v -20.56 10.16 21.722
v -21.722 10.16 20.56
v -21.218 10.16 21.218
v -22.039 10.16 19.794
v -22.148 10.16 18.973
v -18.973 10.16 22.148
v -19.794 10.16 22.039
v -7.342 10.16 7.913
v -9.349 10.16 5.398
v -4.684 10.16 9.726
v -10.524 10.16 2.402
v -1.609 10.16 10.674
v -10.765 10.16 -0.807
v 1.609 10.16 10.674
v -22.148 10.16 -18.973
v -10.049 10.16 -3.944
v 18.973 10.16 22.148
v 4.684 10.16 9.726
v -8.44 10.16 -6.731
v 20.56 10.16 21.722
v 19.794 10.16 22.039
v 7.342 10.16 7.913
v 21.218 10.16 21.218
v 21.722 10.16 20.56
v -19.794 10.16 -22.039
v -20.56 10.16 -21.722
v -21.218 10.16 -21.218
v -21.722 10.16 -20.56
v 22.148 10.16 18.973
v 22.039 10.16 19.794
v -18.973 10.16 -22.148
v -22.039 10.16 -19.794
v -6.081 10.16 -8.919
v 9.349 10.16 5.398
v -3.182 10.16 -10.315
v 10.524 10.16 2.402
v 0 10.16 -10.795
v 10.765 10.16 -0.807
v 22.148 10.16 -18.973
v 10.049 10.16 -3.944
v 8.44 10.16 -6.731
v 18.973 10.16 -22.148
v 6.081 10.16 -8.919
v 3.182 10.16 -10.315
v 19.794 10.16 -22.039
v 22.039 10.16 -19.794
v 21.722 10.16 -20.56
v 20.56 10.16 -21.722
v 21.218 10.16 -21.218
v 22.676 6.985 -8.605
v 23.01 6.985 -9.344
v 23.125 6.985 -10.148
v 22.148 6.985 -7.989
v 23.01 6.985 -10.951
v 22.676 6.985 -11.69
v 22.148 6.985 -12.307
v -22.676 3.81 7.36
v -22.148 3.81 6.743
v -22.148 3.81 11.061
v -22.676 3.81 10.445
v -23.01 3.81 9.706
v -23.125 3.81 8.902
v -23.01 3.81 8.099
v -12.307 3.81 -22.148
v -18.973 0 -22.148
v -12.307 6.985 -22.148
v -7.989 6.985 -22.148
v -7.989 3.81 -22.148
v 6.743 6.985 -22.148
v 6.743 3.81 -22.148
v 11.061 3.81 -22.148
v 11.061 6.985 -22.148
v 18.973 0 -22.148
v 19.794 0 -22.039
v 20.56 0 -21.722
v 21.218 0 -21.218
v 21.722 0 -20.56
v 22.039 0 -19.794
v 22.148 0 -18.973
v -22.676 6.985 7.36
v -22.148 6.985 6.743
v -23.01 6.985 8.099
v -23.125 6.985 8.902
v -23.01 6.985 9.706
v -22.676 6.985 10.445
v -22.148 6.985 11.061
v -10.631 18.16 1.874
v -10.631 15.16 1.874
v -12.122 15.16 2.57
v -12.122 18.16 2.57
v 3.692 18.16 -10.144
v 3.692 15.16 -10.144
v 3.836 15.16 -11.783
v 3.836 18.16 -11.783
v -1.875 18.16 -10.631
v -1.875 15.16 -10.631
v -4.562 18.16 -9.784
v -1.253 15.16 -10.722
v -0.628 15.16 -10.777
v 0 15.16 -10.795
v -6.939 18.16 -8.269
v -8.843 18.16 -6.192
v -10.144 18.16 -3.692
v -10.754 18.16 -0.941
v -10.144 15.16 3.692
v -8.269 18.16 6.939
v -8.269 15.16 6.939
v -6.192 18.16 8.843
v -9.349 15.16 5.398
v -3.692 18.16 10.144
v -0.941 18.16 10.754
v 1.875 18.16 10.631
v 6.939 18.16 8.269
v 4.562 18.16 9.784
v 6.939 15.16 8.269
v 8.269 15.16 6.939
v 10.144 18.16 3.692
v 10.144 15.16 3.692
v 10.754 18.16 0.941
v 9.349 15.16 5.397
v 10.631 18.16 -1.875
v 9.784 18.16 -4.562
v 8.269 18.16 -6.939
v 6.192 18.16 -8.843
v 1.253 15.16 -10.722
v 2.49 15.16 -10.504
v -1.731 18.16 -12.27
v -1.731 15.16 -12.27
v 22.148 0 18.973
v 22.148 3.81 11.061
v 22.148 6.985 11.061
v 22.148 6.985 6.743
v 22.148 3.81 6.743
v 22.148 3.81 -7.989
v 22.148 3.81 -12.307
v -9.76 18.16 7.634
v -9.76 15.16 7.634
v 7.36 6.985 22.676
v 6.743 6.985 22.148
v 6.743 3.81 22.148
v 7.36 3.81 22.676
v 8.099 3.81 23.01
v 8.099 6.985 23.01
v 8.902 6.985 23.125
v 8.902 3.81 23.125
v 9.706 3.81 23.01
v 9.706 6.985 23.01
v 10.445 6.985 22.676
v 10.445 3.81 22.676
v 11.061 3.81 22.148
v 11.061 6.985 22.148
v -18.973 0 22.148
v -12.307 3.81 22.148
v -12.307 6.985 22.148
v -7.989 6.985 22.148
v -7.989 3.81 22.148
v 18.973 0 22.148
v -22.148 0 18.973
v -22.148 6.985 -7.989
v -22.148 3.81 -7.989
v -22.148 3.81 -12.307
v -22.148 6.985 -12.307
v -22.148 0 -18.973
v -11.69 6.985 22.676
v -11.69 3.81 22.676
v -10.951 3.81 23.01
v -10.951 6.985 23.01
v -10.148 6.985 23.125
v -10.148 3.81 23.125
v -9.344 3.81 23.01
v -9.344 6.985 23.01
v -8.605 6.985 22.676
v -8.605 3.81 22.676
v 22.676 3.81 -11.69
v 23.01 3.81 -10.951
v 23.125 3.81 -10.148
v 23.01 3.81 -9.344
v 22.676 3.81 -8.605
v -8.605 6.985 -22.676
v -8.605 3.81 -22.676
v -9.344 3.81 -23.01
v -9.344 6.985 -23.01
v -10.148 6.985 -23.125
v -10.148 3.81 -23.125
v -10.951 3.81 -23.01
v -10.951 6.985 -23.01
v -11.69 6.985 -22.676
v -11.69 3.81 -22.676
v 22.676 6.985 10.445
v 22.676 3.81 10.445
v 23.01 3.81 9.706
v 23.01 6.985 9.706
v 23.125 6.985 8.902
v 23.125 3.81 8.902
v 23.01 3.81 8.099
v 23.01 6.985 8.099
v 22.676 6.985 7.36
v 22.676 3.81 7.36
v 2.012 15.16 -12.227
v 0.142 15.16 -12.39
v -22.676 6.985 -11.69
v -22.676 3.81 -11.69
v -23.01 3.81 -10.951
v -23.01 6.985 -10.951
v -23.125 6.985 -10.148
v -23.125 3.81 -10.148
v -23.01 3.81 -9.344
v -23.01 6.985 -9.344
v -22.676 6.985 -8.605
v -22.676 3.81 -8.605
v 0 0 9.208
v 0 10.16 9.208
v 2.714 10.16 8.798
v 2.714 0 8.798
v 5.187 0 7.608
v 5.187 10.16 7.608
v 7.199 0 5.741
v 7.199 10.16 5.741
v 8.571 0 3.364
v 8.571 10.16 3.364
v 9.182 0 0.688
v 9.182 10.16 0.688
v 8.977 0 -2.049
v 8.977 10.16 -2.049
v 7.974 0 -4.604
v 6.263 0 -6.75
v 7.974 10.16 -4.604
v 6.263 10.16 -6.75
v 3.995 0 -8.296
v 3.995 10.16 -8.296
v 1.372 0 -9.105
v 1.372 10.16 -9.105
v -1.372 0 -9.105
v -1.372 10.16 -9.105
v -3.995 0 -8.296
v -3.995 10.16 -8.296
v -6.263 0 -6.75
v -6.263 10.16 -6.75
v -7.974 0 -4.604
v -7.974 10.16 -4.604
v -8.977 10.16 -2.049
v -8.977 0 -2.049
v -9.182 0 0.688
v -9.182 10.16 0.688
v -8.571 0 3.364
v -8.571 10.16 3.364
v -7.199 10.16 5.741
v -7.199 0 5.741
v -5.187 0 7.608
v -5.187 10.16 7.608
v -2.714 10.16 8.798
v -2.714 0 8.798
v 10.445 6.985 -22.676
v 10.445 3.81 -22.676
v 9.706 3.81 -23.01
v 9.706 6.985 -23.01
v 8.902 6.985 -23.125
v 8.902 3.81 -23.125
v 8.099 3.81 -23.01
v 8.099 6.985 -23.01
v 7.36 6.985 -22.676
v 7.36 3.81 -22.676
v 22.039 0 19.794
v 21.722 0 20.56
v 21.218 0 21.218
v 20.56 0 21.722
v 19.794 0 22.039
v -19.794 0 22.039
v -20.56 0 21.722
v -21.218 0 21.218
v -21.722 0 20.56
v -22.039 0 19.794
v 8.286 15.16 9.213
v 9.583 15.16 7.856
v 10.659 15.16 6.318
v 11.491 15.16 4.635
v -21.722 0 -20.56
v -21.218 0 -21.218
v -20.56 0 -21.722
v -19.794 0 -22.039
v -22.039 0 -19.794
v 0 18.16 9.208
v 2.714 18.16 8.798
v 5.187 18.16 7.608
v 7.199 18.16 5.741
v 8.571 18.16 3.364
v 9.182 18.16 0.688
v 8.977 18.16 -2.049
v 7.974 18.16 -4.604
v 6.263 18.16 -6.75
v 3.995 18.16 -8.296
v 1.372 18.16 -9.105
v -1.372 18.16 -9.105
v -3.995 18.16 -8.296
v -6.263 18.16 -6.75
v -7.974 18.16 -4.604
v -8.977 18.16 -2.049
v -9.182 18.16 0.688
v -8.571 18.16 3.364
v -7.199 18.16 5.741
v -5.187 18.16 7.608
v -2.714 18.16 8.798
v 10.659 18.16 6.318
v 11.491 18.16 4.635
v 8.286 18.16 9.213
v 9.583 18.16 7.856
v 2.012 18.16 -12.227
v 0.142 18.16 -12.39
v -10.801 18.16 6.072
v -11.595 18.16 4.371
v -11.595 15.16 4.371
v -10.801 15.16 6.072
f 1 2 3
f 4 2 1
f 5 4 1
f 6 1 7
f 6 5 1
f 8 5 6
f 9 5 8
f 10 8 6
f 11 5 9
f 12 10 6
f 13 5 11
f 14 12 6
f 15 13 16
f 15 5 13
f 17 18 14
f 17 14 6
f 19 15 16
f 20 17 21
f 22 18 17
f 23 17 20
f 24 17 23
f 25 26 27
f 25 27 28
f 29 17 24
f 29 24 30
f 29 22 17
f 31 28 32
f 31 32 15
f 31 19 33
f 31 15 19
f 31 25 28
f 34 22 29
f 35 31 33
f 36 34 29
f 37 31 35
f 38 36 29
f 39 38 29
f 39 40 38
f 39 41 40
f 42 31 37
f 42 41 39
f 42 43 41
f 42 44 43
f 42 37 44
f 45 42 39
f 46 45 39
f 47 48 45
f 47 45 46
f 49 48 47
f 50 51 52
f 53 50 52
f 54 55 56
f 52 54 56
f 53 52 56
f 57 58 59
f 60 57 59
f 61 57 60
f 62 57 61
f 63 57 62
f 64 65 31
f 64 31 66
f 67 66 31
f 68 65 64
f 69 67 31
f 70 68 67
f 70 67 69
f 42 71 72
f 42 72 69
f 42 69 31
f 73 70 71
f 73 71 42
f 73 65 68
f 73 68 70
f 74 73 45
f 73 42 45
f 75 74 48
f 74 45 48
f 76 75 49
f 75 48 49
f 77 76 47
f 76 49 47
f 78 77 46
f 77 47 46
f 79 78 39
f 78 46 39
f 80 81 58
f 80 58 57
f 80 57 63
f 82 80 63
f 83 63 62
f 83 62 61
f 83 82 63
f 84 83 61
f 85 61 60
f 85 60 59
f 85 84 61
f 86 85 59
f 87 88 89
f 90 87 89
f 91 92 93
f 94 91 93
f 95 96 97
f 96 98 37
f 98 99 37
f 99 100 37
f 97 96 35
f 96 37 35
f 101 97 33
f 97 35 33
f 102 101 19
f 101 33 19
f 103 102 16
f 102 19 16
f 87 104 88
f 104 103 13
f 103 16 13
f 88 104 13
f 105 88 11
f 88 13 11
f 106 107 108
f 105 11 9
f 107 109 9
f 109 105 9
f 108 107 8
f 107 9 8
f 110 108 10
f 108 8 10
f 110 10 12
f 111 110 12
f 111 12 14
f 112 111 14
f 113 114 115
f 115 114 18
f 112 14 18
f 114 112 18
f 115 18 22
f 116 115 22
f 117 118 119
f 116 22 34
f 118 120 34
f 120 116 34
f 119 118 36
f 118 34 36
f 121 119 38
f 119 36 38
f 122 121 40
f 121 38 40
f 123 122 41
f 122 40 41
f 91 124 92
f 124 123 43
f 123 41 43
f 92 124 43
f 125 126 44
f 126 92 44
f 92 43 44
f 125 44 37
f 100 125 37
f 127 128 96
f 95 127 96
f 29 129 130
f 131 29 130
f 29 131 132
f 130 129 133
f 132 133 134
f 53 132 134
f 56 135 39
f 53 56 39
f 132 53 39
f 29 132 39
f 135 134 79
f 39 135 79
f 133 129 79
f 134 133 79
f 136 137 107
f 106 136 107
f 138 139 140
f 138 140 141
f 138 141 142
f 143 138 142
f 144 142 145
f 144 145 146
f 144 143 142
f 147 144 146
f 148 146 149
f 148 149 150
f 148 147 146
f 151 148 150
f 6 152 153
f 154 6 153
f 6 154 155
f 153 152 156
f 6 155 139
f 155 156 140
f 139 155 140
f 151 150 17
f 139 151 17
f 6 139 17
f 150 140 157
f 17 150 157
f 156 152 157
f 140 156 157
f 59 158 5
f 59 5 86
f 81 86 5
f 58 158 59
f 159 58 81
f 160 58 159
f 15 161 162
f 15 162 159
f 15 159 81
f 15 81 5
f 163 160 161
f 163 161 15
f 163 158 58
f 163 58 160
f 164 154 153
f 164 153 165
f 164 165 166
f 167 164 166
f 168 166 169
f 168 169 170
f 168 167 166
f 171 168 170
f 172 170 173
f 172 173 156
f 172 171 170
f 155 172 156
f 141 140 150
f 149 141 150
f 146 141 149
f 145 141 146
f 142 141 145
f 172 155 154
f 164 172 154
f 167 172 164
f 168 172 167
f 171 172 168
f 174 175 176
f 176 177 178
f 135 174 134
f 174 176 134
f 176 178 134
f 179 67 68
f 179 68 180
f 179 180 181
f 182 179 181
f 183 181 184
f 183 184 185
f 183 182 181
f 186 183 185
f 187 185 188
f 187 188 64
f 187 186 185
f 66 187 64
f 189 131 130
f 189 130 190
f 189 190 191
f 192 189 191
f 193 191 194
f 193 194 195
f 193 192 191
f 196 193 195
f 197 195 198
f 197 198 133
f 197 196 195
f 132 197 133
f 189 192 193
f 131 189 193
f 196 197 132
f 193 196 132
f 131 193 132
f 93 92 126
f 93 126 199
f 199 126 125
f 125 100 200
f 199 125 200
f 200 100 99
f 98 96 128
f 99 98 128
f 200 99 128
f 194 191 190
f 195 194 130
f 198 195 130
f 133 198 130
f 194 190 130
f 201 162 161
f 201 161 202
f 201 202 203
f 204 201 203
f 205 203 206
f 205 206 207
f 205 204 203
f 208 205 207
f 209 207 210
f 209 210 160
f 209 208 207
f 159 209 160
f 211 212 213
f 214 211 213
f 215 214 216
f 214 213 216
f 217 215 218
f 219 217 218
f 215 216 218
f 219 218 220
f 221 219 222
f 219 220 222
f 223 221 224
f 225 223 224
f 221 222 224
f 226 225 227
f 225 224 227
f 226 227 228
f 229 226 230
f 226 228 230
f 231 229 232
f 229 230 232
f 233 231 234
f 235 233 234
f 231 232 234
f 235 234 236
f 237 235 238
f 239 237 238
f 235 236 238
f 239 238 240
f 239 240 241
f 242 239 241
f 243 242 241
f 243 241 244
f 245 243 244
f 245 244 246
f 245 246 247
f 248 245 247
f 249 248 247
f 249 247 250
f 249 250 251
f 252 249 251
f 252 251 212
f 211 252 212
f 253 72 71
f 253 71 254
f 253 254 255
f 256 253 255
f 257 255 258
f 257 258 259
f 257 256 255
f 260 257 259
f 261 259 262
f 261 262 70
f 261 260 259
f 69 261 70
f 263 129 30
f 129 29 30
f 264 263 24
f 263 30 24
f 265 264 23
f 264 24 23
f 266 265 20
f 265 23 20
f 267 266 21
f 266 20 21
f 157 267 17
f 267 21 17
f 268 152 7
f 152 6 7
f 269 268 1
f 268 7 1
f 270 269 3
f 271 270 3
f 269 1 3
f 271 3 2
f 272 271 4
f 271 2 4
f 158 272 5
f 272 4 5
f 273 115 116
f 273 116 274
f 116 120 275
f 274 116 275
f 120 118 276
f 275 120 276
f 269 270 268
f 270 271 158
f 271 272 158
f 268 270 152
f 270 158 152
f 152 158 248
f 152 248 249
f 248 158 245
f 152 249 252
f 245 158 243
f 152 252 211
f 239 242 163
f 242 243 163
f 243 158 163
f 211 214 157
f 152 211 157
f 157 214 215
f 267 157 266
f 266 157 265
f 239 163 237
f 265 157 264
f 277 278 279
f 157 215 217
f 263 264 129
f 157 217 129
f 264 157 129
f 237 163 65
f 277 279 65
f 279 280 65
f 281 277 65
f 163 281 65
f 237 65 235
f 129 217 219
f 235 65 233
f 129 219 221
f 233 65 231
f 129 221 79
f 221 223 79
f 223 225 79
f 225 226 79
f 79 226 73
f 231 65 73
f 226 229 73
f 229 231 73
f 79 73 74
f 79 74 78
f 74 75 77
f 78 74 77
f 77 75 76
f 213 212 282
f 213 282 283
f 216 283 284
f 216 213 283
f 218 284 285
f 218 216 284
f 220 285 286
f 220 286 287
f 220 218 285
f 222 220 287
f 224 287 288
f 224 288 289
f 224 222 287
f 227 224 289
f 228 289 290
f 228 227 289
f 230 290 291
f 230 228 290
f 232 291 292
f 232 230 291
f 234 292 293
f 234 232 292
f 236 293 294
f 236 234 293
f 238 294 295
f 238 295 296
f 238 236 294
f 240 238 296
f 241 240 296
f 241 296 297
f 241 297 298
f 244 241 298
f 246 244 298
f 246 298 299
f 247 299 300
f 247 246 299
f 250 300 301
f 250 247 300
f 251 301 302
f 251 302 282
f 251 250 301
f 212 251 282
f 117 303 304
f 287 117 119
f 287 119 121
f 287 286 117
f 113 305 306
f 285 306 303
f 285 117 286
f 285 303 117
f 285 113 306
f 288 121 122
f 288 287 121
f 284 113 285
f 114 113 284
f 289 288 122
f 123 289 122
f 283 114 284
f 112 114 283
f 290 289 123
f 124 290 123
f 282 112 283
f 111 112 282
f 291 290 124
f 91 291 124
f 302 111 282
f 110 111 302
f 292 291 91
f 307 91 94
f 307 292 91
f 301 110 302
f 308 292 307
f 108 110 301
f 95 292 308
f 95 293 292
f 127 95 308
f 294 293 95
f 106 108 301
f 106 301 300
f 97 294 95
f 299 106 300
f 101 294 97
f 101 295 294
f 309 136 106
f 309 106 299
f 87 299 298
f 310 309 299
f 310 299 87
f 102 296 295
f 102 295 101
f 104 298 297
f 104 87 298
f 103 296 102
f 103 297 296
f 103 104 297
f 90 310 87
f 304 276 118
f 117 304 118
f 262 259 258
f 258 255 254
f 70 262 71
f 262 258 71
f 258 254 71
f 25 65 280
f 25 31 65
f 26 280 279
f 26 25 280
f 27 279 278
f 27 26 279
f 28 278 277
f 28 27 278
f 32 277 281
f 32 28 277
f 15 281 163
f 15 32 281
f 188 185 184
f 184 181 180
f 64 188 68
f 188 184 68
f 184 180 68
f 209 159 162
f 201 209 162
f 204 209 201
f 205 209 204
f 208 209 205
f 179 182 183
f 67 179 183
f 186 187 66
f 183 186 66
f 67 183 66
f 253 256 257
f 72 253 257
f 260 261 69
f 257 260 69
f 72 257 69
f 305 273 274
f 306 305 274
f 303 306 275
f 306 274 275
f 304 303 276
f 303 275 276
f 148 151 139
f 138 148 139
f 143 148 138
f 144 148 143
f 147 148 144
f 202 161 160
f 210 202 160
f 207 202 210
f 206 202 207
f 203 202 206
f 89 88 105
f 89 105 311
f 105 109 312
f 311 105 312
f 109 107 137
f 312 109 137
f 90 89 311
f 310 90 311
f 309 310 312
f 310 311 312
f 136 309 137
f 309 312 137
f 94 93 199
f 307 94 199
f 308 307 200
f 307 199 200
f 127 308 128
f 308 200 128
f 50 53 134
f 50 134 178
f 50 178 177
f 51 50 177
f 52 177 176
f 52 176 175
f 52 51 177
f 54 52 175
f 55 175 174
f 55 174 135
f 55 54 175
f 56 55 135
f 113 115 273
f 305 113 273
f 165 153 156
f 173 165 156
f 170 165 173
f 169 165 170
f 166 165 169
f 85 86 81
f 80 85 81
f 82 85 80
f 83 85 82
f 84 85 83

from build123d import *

# Parameters (mm, degrees)
SKETCH1_W                = 44.29506
SKETCH1_H                = 44.29506
BOSS_EXTRUDE1_DEPTH      = 10.16
SKETCH2_R                = 10.795
SKETCH2_R_2              = 9.2075
BOSS_EXTRUDE2_DEPTH      = 8
BOSS_EXTRUDE3_START      = -3
BOSS_EXTRUDE3_DEPTH      = 3
CIRPATTERN1_COUNT        = 3
BOSS_EXTRUDE4_DEPTH      = 6.35
CUT_EXTRUDE1_DEPTH       = 3.175
LPATTERN1_COUNT          = 2
LPATTERN1_PITCH          = 19.05
FILLET1_R                = 3.175
CIRPATTERN2_COUNT        = 2
CIRPATTERN2_ANGLE        = 90
CIRPATTERN2_COPY_1_DEPTH = 6.35
CIRPATTERN2_COPY_2_DEPTH = 3.175
SKETCH13_R               = 9.2075
CUT_EXTRUDE2_DEPTH       = 35.245537666


with BuildPart() as part:
    # Sketch1 → Boss-Extrude1 (new body)
    with BuildSketch(Plane(origin=(0, 0, 0), x_dir=(1, 0, 0), z_dir=(0, 1, 0))):
        Rectangle(SKETCH1_W, SKETCH1_H)
    extrude(amount=BOSS_EXTRUDE1_DEPTH)

    # Sketch2 → Boss-Extrude2 (add)
    with BuildSketch(Plane(origin=(0, 10.16, 0), x_dir=(1, 0, 0), z_dir=(0, 1, 0))):
        with Locations(Location((0, 0, 0), (0, 0, 90))):
            Circle(SKETCH2_R)
        with Locations(Location((0, 0, 0), (0, 0, 270))):
            Circle(SKETCH2_R_2, mode=Mode.SUBTRACT)
    extrude(amount=BOSS_EXTRUDE2_DEPTH)

    # Sketch5 → Boss-Extrude3 (add)
    with BuildSketch(Plane(origin=(0, 18.16, 0), x_dir=(1, 0, 0), z_dir=(0, 1, 0)).offset(BOSS_EXTRUDE3_START)):
        with BuildLine():
            ThreePointArc((10.143998982, -3.692060354), (8.842746318, -6.19175763), (6.938853856, -8.269481977))
            Line((6.938853856, -8.269481977), (8.286221198, -9.212918747))
            ThreePointArc((8.286221198, -9.212918747), (10.150194049, -7.107242387), (11.491366324, -4.635497124))
            Line((11.491366324, -4.635497124), (10.143998982, -3.692060354))
        make_face()
    boss_extrude3 = extrude(amount=BOSS_EXTRUDE3_DEPTH)

    # CirPattern1: Boss-Extrude3 ×3 about axis
    cirpattern1_axis = Axis((0, 0, 0), (0, 1, 0))
    for i in range(1, CIRPATTERN1_COUNT):
        add(boss_extrude3.rotate(cirpattern1_axis, i * 360 / CIRPATTERN1_COUNT))

    # Sketch6 → Boss-Extrude4 (add)
    with BuildSketch(Plane(origin=(0, 10.16, 0), x_dir=(1, 0, 0), z_dir=(0, 1, 0))):
        with BuildLine():
            Line((-12.30653, 22.14753), (-7.98853, 22.14753))
            ThreePointArc((-7.98853, 22.14753), (-10.14753, 23.125), (-12.30653, 22.14753))
        make_face()
        with BuildLine():
            Line((-7.98853, -22.14753), (-12.30653, -22.14753))
            ThreePointArc((-12.30653, -22.14753), (-10.14753, -23.125), (-7.98853, -22.14753))
        make_face()
    boss_extrude4 = extrude(amount=-BOSS_EXTRUDE4_DEPTH)

    # Sketch7 → Cut-Extrude1 (cut)
    with BuildSketch(Plane(origin=(0, 10.16, 0), x_dir=(1, 0, 0), z_dir=(0, 1, 0))):
        with BuildLine():
            Line((-7.98853, 22.14753), (-12.30653, 22.14753))
            ThreePointArc((-12.30653, 22.14753), (-10.14753, 23.125), (-7.98853, 22.14753))
        make_face()
        with BuildLine():
            Line((-12.30653, -22.14753), (-7.98853, -22.14753))
            ThreePointArc((-7.98853, -22.14753), (-10.14753, -23.125), (-12.30653, -22.14753))
        make_face()
    cut_extrude1 = extrude(amount=-CUT_EXTRUDE1_DEPTH, mode=Mode.SUBTRACT)

    # LPattern1: Boss-Extrude4, Cut-Extrude1 ×2
    with Locations(*[(i * LPATTERN1_PITCH, 0, 0) for i in range(1, LPATTERN1_COUNT)]):
        add(boss_extrude4)
        add(cut_extrude1, mode=Mode.SUBTRACT)

    # Fillet1
    fillet1_edges = [part.edges().sort_by_distance(p)[0] for p in [
        (22.14753, 5.08, 22.14753),
        (-22.14753, 5.08, 22.14753),
        (-22.14753, 5.08, -22.14753),
        (22.14753, 5.08, -22.14753),
    ]]
    fillet(fillet1_edges, radius=FILLET1_R)

    # CirPattern2: Boss-Extrude4, Cut-Extrude1 ×2 about axis
    cirpattern2_axis = Axis((0, 0, 0), (0, -1, 0))
    add([boss_extrude4.rotate(cirpattern2_axis, i * CIRPATTERN2_ANGLE / (CIRPATTERN2_COUNT - 1)) for i in range(1, CIRPATTERN2_COUNT)])
    add([cut_extrude1.rotate(cirpattern2_axis, i * CIRPATTERN2_ANGLE / (CIRPATTERN2_COUNT - 1)) for i in range(1, CIRPATTERN2_COUNT)], mode=Mode.SUBTRACT)

    # CirPattern2 copy 1 sketch → CirPattern2 copy 1 (add)
    with BuildSketch(Plane(origin=(0, 10.16, 19.05), x_dir=(0, 0, 1), z_dir=(0, 1, 0))):
        with BuildLine():
            Line((-12.30653, 22.14753), (-7.98853, 22.14753))
            ThreePointArc((-7.98853, 22.14753), (-10.14753, 23.125), (-12.30653, 22.14753))
        make_face()
        with BuildLine():
            Line((-7.98853, -22.14753), (-12.30653, -22.14753))
            ThreePointArc((-12.30653, -22.14753), (-10.14753, -23.125), (-7.98853, -22.14753))
        make_face()
    extrude(amount=-CIRPATTERN2_COPY_1_DEPTH)

    # CirPattern2 copy 2 sketch → CirPattern2 copy 2 (cut)
    with BuildSketch(Plane(origin=(0, 10.16, 19.05), x_dir=(0, 0, 1), z_dir=(0, 1, 0))):
        with BuildLine():
            Line((-7.98853, 22.14753), (-12.30653, 22.14753))
            ThreePointArc((-12.30653, 22.14753), (-10.14753, 23.125), (-7.98853, 22.14753))
        make_face()
        with BuildLine():
            Line((-12.30653, -22.14753), (-7.98853, -22.14753))
            ThreePointArc((-7.98853, -22.14753), (-10.14753, -23.125), (-12.30653, -22.14753))
        make_face()
    extrude(amount=-CIRPATTERN2_COPY_2_DEPTH, mode=Mode.SUBTRACT)

    # Sketch13 → Cut-Extrude2 (cut, through all)
    with BuildSketch(Plane(origin=(0, 10.16, 0), x_dir=(1, 0, 0), z_dir=(0, 1, 0))):
        with Locations(Location((0, 0, 0), (0, 0, 270))):
            Circle(SKETCH13_R)
    extrude(amount=-CUT_EXTRUDE2_DEPTH, mode=Mode.SUBTRACT)


solid = part.part
